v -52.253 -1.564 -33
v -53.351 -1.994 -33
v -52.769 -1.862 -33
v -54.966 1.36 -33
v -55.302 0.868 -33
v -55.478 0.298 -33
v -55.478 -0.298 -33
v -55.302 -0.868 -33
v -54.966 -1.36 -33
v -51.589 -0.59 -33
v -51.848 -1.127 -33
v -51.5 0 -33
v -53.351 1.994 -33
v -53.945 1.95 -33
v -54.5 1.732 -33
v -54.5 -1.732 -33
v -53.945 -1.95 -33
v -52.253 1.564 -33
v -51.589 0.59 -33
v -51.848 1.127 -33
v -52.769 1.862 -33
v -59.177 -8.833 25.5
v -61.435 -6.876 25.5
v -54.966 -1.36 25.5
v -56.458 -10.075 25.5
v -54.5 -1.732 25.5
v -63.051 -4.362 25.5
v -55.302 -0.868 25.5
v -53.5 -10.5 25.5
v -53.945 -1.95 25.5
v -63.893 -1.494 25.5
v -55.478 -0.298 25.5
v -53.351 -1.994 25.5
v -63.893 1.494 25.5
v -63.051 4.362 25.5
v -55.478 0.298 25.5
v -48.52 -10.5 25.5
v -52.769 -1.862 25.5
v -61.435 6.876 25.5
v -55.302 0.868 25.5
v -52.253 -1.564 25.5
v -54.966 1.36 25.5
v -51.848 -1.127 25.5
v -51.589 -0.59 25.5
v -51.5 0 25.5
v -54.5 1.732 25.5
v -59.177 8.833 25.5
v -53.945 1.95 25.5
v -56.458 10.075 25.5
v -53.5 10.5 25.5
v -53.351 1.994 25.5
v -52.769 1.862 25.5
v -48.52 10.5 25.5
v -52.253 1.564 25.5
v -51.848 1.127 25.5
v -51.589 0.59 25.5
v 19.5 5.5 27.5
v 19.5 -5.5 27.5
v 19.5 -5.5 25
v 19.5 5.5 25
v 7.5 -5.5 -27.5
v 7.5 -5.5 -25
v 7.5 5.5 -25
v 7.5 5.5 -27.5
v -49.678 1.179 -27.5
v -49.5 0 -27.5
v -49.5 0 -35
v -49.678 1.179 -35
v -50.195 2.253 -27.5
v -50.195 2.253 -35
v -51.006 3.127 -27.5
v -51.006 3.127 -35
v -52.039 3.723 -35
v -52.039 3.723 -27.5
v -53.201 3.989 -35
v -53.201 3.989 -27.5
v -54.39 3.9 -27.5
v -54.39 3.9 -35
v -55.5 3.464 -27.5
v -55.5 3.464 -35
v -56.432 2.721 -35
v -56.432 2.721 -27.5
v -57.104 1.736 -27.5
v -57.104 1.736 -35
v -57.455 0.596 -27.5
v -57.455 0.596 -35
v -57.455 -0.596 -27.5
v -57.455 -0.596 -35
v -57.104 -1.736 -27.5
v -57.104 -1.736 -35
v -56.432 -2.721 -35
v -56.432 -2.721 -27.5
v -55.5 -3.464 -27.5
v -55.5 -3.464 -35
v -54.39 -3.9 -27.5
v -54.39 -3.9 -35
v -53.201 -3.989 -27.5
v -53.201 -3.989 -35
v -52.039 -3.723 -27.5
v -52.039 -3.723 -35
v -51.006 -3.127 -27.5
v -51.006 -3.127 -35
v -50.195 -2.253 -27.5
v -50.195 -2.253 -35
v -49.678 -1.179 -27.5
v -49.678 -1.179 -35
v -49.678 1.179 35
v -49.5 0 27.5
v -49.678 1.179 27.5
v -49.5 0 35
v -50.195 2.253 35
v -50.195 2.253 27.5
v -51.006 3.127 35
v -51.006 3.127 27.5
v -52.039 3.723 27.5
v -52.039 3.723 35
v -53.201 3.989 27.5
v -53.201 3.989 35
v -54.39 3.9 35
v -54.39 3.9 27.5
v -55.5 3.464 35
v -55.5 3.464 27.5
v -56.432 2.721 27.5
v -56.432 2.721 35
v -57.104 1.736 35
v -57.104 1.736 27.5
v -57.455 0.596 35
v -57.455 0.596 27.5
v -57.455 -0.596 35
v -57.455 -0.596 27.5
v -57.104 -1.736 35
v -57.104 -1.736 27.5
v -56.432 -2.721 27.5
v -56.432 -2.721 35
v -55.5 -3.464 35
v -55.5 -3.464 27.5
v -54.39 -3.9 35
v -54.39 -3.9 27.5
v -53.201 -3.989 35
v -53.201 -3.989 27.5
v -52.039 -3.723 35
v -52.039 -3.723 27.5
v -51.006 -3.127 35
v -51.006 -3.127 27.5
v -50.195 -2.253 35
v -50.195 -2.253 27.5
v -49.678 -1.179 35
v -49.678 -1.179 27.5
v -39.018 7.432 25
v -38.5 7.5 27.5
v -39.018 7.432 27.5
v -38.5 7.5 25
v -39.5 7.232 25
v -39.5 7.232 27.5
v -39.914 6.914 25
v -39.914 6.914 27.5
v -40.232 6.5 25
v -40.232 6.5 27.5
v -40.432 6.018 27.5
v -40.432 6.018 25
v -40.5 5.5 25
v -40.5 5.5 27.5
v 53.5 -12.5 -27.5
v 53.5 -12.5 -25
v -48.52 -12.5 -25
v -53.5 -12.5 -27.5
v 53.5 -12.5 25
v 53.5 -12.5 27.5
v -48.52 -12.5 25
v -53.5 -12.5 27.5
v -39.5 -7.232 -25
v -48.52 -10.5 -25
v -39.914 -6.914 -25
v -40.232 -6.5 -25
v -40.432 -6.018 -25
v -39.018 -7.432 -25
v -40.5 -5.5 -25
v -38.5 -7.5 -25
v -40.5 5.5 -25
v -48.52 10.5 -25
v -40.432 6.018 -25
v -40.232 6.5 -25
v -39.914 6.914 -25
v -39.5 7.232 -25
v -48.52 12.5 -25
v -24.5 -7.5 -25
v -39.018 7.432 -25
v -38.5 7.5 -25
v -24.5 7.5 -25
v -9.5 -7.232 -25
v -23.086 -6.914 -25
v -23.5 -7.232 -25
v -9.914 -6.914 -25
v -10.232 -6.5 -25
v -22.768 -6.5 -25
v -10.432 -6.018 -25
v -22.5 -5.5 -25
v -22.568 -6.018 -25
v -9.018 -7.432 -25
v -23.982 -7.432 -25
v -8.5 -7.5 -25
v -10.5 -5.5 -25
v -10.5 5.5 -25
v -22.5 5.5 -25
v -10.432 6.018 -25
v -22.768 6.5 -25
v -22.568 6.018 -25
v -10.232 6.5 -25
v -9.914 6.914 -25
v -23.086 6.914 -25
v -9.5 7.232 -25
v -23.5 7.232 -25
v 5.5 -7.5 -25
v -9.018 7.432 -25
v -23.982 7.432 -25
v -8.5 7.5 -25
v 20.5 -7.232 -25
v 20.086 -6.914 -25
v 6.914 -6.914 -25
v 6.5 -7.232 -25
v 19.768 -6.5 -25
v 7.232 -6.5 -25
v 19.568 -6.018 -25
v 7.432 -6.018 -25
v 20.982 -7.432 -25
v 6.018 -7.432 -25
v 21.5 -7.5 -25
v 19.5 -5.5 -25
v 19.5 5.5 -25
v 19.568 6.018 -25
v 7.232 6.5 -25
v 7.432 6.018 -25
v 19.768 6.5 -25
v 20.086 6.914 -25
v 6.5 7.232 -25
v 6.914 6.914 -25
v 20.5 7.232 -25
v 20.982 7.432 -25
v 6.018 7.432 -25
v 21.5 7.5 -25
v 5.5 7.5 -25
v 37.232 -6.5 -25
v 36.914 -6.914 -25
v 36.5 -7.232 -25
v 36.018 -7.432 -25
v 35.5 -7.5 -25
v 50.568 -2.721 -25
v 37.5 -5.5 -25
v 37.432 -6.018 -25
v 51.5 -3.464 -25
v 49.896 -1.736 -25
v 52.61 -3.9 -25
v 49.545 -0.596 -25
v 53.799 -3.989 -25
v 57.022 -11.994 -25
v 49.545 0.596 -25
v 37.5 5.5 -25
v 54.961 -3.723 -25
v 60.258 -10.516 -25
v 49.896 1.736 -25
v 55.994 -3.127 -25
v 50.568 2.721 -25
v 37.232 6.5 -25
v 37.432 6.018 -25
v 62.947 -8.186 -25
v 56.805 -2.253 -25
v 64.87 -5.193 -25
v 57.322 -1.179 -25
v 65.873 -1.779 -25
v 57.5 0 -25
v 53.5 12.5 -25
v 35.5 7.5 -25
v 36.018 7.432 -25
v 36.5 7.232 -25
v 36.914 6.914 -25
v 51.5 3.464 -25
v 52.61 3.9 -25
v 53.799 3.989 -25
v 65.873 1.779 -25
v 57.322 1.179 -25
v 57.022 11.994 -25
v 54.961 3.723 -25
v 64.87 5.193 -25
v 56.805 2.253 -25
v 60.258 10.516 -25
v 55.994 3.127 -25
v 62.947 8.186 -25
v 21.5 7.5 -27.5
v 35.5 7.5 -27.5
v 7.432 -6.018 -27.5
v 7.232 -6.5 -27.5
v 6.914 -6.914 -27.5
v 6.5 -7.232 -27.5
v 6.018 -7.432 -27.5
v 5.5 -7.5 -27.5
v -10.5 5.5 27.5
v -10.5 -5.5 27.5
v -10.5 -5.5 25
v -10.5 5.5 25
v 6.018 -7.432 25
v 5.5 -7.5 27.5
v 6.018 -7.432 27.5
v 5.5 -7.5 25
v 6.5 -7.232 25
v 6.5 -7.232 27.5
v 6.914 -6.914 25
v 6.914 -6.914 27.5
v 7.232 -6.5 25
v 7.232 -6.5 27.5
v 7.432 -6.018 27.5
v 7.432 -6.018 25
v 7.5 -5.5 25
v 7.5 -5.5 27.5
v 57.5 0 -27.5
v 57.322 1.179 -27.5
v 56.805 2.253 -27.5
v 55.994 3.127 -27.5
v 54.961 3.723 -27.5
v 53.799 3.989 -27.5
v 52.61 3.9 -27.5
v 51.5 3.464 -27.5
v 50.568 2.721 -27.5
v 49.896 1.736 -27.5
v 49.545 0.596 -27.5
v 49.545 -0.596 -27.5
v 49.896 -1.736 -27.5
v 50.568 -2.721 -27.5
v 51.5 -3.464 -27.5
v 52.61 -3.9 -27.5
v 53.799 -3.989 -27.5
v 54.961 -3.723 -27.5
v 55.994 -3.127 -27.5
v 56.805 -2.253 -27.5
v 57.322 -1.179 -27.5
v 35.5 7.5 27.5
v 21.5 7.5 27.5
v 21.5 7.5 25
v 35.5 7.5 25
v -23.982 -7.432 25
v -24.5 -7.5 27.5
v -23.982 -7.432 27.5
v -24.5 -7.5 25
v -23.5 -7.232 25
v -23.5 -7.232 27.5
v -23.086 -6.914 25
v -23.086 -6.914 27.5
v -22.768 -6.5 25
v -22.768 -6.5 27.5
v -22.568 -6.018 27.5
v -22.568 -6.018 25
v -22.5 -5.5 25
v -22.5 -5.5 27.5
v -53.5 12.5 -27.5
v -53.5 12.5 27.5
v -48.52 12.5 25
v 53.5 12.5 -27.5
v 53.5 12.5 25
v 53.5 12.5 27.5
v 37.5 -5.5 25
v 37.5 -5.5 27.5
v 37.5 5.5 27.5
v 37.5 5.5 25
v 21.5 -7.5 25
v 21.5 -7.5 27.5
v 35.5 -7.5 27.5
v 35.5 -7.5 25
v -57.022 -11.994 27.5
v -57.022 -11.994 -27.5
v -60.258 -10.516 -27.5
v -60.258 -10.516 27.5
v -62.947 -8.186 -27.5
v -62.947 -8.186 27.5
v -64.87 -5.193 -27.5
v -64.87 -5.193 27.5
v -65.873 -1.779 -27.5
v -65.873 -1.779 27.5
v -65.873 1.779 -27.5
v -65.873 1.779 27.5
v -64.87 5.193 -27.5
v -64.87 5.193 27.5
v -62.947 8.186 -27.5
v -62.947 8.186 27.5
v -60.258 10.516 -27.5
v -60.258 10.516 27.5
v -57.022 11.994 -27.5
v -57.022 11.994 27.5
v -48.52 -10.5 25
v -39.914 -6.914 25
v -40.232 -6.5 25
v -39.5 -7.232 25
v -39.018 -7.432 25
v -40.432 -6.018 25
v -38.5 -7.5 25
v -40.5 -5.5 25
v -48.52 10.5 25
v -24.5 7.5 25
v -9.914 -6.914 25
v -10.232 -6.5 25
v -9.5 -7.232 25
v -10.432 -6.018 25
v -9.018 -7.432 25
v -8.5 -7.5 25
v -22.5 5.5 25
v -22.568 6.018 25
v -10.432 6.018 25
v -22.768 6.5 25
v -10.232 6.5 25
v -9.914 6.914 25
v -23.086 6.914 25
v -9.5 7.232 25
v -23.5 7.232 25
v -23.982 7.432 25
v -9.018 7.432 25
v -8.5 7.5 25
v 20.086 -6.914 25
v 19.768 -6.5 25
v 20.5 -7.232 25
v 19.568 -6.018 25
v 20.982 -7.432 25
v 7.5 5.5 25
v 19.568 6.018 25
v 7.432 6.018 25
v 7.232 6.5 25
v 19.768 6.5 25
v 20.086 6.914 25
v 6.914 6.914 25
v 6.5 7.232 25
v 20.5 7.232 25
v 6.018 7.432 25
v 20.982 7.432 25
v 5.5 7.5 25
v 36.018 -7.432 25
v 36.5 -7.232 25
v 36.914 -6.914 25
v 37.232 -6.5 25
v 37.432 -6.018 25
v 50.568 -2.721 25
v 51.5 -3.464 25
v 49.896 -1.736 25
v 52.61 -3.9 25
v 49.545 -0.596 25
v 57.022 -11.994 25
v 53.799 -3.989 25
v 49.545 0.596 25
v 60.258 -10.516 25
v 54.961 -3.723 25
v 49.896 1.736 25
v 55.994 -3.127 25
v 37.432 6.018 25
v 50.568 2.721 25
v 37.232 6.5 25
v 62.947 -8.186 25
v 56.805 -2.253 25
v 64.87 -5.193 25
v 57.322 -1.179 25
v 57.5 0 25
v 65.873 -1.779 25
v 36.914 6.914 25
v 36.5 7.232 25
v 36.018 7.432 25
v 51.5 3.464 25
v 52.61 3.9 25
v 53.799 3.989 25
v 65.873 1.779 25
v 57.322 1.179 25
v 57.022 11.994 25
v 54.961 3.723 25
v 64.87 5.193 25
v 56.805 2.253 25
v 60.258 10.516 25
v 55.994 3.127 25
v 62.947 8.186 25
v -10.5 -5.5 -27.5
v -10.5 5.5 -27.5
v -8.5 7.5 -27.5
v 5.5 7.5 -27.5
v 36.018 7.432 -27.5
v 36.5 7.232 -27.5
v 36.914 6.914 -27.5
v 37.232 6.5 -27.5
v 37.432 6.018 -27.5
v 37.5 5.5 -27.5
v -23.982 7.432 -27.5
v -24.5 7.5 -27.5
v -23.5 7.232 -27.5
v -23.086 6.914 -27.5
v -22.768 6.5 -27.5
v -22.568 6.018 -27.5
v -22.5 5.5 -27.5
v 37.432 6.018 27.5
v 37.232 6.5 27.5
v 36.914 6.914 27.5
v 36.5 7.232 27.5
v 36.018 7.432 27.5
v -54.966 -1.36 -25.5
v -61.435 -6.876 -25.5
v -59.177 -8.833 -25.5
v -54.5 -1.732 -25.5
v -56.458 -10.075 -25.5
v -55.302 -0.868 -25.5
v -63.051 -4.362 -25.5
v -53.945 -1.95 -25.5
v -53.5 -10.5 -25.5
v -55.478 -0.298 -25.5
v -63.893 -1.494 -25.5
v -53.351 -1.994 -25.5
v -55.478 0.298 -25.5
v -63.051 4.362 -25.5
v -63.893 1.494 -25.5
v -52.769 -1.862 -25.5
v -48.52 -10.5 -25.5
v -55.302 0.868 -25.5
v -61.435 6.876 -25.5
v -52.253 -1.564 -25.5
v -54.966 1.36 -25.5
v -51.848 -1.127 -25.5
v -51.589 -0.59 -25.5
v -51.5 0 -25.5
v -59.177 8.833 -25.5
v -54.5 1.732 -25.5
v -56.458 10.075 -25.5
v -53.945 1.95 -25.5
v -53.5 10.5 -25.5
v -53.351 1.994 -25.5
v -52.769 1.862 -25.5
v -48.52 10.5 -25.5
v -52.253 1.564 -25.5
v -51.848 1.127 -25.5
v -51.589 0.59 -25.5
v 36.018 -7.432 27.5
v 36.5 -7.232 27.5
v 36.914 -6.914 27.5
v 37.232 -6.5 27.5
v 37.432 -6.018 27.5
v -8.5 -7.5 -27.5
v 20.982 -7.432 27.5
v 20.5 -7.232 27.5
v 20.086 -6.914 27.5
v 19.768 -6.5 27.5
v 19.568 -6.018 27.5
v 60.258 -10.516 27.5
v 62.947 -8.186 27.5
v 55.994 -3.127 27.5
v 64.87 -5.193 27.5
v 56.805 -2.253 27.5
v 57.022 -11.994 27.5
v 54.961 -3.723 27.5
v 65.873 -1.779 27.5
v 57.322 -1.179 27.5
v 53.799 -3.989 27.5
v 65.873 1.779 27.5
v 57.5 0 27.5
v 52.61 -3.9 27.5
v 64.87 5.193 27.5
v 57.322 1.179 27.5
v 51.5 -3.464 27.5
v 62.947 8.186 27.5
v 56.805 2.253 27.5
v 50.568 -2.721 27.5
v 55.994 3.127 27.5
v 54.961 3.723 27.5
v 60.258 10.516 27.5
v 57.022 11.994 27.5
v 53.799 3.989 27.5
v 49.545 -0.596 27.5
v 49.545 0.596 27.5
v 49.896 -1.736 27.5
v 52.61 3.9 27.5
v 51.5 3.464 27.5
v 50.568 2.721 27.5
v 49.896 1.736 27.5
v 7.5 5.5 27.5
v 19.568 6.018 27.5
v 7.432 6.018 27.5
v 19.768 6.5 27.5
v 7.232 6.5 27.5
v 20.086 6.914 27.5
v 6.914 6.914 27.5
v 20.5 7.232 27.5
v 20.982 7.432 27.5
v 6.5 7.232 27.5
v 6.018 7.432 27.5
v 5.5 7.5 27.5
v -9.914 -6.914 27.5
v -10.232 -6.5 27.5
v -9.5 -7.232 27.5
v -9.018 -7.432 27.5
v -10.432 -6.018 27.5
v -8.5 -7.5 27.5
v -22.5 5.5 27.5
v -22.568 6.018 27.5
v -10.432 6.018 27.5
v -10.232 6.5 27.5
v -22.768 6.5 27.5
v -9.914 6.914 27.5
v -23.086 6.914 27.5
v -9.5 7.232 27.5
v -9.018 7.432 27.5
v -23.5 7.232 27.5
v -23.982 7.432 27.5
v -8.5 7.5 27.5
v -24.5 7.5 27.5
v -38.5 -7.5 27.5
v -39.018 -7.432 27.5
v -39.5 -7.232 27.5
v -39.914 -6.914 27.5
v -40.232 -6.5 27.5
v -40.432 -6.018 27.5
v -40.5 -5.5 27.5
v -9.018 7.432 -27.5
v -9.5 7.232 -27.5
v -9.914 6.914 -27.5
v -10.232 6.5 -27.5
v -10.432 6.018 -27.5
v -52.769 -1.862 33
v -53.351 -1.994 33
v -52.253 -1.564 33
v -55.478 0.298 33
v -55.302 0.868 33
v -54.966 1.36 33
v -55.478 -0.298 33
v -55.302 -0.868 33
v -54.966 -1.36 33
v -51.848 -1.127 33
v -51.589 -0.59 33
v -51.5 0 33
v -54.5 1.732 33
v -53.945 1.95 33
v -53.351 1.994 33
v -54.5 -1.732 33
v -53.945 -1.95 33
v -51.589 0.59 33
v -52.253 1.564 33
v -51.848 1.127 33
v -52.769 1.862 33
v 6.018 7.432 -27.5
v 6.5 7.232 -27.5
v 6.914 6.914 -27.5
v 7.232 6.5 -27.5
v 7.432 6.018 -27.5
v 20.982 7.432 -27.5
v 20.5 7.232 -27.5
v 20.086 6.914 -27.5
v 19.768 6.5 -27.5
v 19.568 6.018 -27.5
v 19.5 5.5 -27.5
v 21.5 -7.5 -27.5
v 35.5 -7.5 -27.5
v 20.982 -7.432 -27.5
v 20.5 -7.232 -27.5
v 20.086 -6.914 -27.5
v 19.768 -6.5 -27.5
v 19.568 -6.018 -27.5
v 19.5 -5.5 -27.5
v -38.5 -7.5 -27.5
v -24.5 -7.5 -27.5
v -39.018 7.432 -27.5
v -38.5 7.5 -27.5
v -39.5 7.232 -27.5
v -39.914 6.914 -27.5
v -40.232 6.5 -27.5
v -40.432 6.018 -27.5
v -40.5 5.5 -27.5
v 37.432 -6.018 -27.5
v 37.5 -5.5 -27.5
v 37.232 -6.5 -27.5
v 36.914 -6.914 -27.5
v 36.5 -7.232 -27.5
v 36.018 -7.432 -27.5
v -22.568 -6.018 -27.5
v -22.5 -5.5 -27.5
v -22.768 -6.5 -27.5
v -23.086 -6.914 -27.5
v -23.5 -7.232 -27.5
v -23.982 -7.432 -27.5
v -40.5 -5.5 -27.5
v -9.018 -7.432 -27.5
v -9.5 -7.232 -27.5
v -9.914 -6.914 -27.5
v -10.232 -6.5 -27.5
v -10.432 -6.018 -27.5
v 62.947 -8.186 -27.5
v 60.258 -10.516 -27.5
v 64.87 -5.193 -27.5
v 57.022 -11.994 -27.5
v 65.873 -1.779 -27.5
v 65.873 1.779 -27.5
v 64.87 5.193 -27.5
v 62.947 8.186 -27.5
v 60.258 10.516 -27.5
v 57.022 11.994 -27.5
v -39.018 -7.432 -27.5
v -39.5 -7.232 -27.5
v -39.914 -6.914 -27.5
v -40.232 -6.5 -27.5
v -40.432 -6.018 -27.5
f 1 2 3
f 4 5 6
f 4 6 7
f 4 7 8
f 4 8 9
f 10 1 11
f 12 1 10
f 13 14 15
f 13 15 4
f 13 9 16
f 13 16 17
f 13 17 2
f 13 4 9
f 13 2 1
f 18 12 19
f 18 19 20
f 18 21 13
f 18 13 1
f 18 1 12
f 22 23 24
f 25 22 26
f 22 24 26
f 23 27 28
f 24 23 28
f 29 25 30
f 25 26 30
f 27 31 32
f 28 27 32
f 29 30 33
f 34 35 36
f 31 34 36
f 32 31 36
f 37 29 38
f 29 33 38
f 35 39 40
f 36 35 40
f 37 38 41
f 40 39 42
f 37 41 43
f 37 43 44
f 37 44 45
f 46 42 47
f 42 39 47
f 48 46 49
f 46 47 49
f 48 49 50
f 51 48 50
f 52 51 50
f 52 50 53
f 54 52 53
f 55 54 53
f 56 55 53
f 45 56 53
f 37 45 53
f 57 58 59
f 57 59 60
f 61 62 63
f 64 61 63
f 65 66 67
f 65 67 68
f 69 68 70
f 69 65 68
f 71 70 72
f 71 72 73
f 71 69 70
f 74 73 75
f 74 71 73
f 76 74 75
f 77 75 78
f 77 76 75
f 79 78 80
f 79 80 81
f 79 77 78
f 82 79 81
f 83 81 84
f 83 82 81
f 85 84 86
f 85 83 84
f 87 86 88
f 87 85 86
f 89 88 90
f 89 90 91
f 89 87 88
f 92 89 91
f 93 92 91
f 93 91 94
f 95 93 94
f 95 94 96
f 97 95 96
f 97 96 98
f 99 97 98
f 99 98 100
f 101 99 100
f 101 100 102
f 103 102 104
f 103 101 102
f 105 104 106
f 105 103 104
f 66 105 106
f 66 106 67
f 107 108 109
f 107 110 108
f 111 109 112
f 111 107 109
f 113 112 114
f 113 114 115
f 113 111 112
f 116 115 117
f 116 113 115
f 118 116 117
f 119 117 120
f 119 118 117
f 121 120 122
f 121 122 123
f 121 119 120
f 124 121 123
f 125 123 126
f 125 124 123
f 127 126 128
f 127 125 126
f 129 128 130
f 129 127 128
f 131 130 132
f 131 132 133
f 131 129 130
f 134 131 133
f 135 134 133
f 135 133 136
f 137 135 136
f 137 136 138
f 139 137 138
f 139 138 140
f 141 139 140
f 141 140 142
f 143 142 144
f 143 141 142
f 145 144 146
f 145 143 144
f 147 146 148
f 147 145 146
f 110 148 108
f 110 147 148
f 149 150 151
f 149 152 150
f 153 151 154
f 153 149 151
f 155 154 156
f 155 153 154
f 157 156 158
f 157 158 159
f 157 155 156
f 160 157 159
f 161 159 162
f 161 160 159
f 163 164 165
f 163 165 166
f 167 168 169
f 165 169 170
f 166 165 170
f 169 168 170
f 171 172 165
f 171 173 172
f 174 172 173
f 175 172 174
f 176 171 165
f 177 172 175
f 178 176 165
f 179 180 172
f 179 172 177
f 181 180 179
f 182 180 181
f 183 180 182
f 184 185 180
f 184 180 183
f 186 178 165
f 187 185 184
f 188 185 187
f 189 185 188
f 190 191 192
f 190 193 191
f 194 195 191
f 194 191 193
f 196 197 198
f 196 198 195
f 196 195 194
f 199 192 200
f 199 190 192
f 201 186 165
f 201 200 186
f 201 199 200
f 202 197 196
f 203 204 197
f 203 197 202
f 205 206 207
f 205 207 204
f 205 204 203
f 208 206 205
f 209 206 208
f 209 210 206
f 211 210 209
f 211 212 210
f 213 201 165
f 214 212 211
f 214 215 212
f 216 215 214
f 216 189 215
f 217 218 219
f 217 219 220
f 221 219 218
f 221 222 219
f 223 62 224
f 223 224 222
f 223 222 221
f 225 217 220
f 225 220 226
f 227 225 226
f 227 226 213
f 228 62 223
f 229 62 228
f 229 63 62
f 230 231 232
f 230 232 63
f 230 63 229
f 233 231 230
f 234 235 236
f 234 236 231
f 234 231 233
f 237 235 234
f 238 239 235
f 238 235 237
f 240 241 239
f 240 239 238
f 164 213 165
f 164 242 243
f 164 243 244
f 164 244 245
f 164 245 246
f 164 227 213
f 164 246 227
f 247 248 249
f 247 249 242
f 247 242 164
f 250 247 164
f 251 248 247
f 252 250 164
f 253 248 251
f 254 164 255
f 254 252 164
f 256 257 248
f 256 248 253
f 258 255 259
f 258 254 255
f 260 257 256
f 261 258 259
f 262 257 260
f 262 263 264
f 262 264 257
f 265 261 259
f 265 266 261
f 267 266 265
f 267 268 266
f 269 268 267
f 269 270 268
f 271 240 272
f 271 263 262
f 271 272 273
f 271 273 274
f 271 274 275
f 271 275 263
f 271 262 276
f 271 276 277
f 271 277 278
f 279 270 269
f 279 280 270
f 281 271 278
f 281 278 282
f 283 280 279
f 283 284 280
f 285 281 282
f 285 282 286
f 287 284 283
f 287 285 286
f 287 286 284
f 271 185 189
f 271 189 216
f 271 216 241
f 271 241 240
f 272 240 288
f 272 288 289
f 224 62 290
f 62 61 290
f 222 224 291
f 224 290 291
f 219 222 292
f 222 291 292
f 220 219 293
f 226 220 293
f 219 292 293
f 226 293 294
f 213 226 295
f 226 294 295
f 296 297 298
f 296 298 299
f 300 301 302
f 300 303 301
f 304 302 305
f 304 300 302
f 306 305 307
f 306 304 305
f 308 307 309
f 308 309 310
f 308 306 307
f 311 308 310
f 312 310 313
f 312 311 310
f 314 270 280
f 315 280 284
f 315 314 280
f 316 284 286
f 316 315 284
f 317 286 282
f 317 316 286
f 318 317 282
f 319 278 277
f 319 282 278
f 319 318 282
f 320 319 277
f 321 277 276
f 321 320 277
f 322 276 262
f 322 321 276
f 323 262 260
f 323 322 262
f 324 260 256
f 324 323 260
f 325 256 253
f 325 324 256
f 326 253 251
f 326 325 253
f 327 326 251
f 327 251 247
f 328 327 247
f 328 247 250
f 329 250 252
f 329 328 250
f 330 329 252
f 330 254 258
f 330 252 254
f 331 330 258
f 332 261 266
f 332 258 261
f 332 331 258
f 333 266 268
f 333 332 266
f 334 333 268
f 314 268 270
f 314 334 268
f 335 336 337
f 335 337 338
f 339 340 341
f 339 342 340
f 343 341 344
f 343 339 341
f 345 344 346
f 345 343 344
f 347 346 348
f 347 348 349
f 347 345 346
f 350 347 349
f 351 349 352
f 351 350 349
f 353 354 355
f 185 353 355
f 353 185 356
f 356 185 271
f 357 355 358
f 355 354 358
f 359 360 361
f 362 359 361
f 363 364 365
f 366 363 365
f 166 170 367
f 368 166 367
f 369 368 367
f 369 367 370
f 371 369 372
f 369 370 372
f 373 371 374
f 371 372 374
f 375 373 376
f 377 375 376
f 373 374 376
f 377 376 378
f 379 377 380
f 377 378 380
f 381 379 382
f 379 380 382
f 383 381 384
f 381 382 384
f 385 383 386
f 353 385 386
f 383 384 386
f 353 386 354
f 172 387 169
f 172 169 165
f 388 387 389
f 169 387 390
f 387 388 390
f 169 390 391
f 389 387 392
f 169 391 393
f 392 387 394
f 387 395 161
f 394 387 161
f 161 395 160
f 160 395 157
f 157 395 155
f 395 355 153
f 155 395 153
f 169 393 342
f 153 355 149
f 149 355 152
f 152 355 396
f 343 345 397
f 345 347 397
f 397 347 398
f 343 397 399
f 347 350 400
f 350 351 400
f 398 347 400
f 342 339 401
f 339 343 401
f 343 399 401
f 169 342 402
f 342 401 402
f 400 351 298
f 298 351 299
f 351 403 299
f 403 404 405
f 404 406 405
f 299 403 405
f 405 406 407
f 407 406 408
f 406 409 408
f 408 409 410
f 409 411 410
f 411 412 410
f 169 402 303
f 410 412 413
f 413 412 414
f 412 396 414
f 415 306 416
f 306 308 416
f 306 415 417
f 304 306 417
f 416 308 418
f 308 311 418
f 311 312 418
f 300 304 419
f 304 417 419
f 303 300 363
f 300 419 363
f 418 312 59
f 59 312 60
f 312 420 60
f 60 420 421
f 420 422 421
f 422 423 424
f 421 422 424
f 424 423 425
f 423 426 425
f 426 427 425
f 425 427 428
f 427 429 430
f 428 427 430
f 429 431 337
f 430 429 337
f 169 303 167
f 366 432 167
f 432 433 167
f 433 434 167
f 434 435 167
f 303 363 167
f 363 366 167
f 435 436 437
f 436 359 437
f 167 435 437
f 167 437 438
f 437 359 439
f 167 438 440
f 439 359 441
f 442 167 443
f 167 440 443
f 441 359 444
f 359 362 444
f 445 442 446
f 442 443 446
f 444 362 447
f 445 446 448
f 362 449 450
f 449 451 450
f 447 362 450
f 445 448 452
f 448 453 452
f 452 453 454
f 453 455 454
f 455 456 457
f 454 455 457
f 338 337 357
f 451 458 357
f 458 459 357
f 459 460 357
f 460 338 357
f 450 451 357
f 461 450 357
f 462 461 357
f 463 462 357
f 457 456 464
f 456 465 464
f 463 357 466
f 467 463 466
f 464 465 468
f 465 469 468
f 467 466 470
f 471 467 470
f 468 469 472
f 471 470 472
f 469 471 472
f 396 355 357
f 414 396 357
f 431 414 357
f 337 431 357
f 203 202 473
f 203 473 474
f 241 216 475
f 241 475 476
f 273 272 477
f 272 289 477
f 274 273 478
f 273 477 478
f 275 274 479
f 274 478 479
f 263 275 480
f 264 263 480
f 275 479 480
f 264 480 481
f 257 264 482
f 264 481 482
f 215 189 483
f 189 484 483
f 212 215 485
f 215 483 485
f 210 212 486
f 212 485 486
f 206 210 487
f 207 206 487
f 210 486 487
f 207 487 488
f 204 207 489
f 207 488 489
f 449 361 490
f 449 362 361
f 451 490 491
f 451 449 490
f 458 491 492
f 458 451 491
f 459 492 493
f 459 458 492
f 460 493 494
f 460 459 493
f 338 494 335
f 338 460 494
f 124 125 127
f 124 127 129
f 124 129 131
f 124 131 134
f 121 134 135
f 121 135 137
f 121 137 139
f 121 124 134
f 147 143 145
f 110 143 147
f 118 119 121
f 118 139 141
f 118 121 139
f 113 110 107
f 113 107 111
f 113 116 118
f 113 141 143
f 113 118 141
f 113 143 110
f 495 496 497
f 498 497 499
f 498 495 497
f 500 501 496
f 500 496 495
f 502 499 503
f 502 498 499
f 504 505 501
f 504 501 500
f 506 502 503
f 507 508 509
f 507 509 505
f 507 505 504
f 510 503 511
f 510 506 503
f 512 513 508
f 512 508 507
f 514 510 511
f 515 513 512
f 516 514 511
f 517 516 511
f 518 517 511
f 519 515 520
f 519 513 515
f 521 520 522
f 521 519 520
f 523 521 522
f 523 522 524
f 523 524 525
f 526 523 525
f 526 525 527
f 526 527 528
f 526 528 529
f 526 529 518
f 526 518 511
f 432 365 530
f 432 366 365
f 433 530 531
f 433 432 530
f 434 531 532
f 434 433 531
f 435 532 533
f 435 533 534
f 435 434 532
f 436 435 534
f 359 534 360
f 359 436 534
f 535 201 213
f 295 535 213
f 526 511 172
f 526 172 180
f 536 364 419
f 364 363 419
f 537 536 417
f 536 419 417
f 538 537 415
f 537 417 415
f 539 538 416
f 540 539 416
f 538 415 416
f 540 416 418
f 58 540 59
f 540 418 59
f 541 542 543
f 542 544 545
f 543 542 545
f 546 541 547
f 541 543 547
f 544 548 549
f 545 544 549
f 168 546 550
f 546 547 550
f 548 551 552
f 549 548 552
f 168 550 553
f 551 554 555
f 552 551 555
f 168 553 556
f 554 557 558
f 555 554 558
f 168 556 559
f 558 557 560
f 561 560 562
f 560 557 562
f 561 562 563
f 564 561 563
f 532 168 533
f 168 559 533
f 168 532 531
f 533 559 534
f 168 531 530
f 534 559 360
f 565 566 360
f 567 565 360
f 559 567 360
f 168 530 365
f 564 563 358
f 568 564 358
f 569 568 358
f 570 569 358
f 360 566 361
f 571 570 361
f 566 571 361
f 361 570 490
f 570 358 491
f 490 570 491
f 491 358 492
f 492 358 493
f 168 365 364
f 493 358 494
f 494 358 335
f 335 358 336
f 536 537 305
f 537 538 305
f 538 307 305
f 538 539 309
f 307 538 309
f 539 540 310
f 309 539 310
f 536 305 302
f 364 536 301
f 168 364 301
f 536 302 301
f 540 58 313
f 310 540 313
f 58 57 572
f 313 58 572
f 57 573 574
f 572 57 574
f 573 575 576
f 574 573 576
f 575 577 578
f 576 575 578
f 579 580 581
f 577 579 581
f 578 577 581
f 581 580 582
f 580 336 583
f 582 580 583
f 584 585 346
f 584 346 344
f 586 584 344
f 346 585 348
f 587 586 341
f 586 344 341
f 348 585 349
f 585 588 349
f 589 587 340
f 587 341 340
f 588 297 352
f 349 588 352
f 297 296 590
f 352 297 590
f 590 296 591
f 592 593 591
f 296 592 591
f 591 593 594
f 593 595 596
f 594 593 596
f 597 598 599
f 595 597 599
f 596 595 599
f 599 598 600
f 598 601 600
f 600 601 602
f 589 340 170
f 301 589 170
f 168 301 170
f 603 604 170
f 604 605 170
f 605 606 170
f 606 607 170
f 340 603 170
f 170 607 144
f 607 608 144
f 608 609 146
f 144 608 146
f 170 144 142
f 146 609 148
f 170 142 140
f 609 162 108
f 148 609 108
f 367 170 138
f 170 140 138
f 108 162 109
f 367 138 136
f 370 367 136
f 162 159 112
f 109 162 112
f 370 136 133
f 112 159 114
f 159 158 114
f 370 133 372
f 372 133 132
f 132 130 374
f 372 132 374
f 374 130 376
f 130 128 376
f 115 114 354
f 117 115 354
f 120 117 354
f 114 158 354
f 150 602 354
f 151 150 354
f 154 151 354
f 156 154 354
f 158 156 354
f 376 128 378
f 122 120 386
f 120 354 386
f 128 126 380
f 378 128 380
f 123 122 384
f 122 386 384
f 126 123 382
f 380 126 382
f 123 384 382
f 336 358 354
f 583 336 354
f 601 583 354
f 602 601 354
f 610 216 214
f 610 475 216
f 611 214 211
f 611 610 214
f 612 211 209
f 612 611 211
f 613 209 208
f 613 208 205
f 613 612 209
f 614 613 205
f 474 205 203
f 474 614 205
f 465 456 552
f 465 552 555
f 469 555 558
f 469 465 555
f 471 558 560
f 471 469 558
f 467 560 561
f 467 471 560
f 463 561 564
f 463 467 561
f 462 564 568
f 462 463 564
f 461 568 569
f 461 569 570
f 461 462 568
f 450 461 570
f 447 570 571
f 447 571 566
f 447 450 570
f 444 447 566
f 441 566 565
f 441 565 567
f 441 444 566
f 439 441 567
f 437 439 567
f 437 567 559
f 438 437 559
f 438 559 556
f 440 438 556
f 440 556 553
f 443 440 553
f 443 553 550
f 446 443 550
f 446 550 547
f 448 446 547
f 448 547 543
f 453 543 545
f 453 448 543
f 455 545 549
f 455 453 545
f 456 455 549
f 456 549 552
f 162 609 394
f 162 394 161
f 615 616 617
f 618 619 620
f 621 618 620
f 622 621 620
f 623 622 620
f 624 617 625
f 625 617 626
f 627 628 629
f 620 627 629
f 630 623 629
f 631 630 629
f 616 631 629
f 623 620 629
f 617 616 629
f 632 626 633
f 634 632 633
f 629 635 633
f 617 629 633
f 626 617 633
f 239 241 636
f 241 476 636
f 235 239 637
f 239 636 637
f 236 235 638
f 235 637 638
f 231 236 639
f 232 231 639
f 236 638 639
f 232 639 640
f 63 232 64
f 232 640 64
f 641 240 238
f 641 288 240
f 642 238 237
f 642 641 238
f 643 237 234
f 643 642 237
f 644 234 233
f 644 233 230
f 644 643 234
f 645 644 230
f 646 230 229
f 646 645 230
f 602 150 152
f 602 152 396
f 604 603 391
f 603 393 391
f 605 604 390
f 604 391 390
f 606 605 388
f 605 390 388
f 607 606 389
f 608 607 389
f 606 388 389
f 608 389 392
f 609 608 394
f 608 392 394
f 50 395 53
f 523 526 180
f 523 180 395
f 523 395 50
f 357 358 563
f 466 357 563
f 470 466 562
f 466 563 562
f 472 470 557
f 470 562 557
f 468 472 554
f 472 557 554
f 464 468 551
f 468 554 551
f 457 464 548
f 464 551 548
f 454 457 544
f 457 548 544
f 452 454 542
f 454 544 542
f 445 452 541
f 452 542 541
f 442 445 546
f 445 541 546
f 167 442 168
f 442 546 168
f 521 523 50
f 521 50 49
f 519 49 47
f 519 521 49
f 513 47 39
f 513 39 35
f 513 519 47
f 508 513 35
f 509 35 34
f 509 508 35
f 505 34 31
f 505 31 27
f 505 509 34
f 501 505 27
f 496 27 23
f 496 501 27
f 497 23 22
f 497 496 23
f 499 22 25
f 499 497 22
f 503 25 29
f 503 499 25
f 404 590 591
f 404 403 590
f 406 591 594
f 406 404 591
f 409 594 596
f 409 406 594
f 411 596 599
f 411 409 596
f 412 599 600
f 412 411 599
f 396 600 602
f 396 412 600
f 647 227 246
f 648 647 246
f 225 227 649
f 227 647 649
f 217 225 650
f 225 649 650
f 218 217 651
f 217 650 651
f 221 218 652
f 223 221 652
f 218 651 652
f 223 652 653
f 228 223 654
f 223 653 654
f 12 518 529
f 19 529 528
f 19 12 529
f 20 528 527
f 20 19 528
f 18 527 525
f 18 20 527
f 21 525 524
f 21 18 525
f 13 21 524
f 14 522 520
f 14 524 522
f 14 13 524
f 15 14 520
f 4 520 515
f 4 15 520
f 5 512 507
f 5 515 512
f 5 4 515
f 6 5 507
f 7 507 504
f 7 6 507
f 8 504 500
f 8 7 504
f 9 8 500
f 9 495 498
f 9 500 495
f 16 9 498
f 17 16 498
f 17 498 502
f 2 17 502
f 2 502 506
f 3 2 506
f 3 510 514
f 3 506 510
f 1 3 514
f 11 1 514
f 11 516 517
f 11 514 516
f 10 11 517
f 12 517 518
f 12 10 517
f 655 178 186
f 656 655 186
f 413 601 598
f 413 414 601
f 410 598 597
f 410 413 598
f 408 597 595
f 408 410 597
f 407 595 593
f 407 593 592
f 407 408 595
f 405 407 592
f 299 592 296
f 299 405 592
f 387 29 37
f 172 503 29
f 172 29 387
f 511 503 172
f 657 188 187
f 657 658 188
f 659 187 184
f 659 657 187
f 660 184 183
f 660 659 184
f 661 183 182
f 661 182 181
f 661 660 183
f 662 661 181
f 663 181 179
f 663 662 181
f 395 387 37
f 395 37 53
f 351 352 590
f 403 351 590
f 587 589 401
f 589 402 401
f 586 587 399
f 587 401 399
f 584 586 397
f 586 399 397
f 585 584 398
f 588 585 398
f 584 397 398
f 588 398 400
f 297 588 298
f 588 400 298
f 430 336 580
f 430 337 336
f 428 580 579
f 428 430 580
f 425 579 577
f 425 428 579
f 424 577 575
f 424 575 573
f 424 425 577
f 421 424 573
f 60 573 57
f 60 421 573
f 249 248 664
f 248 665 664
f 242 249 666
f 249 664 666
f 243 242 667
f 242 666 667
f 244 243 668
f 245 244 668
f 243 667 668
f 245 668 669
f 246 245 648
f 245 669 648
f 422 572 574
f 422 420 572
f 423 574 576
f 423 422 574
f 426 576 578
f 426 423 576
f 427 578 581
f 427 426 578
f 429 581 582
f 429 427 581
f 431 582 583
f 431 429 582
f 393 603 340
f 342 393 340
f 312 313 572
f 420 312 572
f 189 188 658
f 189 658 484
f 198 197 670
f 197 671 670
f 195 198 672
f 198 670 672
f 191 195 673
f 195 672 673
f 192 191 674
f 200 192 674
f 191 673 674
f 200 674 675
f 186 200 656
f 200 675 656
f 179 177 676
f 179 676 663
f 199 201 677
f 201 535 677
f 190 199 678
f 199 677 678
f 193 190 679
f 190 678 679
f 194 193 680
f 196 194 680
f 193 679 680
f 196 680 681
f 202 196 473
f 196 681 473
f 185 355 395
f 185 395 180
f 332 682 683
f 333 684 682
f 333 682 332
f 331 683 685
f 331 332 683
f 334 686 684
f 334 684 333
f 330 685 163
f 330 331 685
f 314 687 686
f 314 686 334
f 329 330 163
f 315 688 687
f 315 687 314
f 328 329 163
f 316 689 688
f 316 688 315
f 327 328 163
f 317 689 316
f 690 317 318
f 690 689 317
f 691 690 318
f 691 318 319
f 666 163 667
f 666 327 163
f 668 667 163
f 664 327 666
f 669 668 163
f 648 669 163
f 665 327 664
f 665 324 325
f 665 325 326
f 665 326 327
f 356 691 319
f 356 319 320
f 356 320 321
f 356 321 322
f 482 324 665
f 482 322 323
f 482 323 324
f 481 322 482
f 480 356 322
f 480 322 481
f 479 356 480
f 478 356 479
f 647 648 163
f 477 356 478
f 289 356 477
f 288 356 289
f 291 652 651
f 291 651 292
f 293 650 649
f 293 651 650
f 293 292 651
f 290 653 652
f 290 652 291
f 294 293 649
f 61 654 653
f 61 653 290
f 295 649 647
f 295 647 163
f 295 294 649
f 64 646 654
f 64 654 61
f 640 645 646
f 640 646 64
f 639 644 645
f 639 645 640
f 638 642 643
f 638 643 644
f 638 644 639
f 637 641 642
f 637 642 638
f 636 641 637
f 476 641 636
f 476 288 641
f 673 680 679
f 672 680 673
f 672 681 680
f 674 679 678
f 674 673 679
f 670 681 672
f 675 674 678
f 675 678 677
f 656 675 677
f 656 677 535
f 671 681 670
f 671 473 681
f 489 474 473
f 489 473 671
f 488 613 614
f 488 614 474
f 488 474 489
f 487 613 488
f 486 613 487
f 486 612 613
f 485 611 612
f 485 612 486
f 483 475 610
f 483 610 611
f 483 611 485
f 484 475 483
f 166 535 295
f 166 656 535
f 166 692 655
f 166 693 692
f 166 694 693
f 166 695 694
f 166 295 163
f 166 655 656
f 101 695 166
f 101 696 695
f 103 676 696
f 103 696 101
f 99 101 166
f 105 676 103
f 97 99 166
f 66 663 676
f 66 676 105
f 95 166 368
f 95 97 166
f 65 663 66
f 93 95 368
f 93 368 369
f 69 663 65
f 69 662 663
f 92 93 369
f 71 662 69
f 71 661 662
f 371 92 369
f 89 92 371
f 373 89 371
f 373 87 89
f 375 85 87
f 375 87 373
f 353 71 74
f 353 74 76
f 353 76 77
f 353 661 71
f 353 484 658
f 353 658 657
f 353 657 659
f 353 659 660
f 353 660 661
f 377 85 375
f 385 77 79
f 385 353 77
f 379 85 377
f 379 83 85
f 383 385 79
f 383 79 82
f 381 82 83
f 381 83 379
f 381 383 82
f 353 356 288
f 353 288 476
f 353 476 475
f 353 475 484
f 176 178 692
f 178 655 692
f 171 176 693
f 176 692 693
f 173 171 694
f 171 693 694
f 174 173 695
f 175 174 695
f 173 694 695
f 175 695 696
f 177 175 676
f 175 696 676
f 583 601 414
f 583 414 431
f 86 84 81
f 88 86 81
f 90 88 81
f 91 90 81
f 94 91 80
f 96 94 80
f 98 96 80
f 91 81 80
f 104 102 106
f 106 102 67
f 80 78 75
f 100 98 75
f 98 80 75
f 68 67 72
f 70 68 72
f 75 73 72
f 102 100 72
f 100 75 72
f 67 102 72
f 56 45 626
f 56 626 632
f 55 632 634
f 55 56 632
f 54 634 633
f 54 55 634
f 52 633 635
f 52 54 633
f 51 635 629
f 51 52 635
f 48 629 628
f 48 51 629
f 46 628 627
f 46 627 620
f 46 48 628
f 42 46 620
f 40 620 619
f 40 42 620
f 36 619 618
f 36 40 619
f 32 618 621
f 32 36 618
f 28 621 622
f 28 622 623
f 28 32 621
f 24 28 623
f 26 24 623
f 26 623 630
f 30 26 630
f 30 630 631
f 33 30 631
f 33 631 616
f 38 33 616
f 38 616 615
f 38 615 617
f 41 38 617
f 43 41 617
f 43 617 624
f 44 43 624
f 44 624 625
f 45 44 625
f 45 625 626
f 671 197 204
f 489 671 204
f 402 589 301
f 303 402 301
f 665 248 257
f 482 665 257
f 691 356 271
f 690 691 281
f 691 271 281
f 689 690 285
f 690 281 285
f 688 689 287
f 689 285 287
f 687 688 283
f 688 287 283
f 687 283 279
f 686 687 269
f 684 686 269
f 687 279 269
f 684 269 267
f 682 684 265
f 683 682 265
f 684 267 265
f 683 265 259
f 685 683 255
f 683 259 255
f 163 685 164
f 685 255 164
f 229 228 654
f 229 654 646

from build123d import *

# Parameters (mm, degrees)
SKETCH1_R              = 4
BOSS_EXTRUDE1_DEPTH    = 27.5
SKETCH2_W              = 61.091432286
SKETCH2_H              = 28.689736928
CUT_EXTRUDE1_DEPTH     = 25
SKETCH3_R              = 4
BOSS_EXTRUDE2_DEPTH    = 35
SKETCH4_W              = 71.474314091
SKETCH4_H              = 50
CUT_EXTRUDE2_DEPTH     = 79.778169565
SHELL1_START           = -25.5
SHELL1_DEPTH           = 51
SHELL1_START_2         = -33
SHELL1_2_OUTLINE_R     = 2
SHELL1_2_DEPTH         = 66
SKETCH5_W              = 18
SKETCH5_H              = 15
CUT_EXTRUDE3_DEPTH     = 92.752384165
FILLET1_R              = 2
LPATTERN1_COUNT        = 3
LPATTERN1_PITCH        = 30
FILLET1_OF_LPATTERN1_R = 2


# Read off the part's stored shape, not the designer's step: Shell1
with BuildPart() as part:
    # Sketch1 → Boss-Extrude1 (new, symmetric)
    with BuildSketch(Plane.XY):
        with BuildLine():
            Line((-53.5, 12.5), (53.5, 12.5))
            ThreePointArc((53.5, 12.5), (66, 0), (53.5, -12.5))
            Line((53.5, -12.5), (-53.5, -12.5))
            ThreePointArc((-53.5, -12.5), (-66, 0), (-53.5, 12.5))
        make_face()
        with Locations((53.5, 0)):
            Circle(SKETCH1_R, mode=Mode.SUBTRACT)
    extrude(amount=BOSS_EXTRUDE1_DEPTH, both=True)

    # Sketch2 → Cut-Extrude1 (cut, symmetric)
    with BuildSketch(Plane.XY):
        with Locations((53.5, 0)):
            Rectangle(SKETCH2_W, SKETCH2_H)
    extrude(amount=CUT_EXTRUDE1_DEPTH, both=True, mode=Mode.SUBTRACT)

    # Sketch3 → Boss-Extrude2 (add, symmetric)
    with BuildSketch(Plane.XY):
        with Locations((-53.5, 0)):
            Circle(SKETCH3_R)
    extrude(amount=BOSS_EXTRUDE2_DEPTH, both=True)

    # Sketch4 → Cut-Extrude2 (cut, through all)
    with BuildSketch(Plane(origin=(0, 12.5, 0), x_dir=(1, 0, 0), z_dir=(0, 1, 0))):
        with Locations((-12.782873189, 0)):
            Rectangle(SKETCH4_W, SKETCH4_H)
    extrude(amount=-CUT_EXTRUDE2_DEPTH, mode=Mode.SUBTRACT)

    # Shell1 outline → Shell1 (cut)
    with BuildSketch(Plane.XY.offset(SHELL1_START)):
        with BuildLine():
            Line((-48.520030234, -10.5), (-48.520030234, 10.5))
            Line((-48.520030234, 10.5), (-53.5, 10.5))
            ThreePointArc((-53.5, 10.5), (-64, 0), (-53.5, -10.5))
            Line((-53.5, -10.5), (-48.520030234, -10.5))
        make_face()
    extrude(amount=SHELL1_DEPTH, mode=Mode.SUBTRACT)

    # Shell1 2 outline → Shell1 2 (cut)
    with BuildSketch(Plane.XY.offset(SHELL1_START_2)):
        with Locations((-53.5, 0)):
            Circle(SHELL1_2_OUTLINE_R)
    extrude(amount=SHELL1_2_DEPTH, mode=Mode.SUBTRACT)

    # Sketch5 → Cut-Extrude3 (cut, through all)
    with BuildSketch(Plane.XY.offset(27.5)):
        with Locations((-31.5, 0)):
            Rectangle(SKETCH5_W, SKETCH5_H)
    cut_extrude3 = extrude(amount=-CUT_EXTRUDE3_DEPTH, mode=Mode.SUBTRACT)

    # Fillet1
    fillet1_edges = [part.edges().sort_by_distance(p)[0] for p in [
        (-40.5, -7.5, -26.25),
        (-40.5, -7.5, 26.25),
        (-40.5, 7.5, -26.25),
        (-40.5, 7.5, 26.25),
        (-22.5, 7.5, -26.25),
        (-22.5, 7.5, 26.25),
        (-22.5, -7.5, -26.25),
        (-22.5, -7.5, 26.25),
    ]]
    fillet(fillet1_edges, radius=FILLET1_R)

    # LPattern1: Cut-Extrude3 ×3
    with Locations(*[(i * LPATTERN1_PITCH, 0, 0) for i in range(1, LPATTERN1_COUNT)]):
        add(cut_extrude3, mode=Mode.SUBTRACT)

    # Fillet1 of LPattern1
    fillet1_of_lpattern1_edges = [part.edges().sort_by_distance(p)[0] for p in [
        (-10.5, -7.5, -26.25),
        (-10.5, -7.5, 26.25),
        (-10.5, 7.5, -26.25),
        (-10.5, 7.5, 26.25),
        (7.5, 7.5, -26.25),
        (7.5, 7.5, 26.25),
        (7.5, -7.5, -26.25),
        (7.5, -7.5, 26.25),
        (19.5, -7.5, -26.25),
        (19.5, -7.5, 26.25),
        (19.5, 7.5, -26.25),
        (19.5, 7.5, 26.25),
        (37.5, 7.5, -26.25),
        (37.5, 7.5, 26.25),
        (37.5, -7.5, -26.25),
        (37.5, -7.5, 26.25),
    ]]
    fillet(fillet1_of_lpattern1_edges, radius=FILLET1_OF_LPATTERN1_R)


solid = part.part
